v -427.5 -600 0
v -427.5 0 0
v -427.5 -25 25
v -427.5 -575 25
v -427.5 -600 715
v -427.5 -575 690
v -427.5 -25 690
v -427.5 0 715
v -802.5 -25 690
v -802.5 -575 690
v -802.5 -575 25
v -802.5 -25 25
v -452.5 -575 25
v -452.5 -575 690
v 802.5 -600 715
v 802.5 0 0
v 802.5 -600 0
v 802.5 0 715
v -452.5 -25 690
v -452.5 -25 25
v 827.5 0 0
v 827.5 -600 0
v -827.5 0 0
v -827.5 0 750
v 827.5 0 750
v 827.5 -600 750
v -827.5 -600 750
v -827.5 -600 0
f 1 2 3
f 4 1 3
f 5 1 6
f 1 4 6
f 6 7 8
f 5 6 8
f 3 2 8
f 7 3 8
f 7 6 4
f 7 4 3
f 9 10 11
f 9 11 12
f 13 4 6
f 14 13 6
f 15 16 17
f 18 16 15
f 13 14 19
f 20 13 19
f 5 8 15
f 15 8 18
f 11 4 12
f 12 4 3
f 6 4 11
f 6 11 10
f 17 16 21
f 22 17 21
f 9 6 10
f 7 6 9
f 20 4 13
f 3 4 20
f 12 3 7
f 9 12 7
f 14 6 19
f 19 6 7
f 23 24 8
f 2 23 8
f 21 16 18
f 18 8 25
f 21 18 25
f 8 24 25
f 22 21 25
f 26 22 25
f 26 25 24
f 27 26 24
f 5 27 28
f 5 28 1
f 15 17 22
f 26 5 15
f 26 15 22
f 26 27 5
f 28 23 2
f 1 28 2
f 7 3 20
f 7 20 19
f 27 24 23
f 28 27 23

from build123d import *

# Parameters (mm, degrees)
F0_W     = 25
F0_H     = 715
F1_DEPTH = 600
F2_W     = 550
F2_H     = 665
F3_DEPTH = 375
F4_DEPTH = 25


with BuildPart() as f1:
    # F0 (on Front) → F1 (new body)
    with BuildSketch(Plane.XZ):
        Polygon((-827.5, 750), (-827.5, 0), (-427.5, 0), (-427.5, 715), (-427.5, 750), align=None)
        Polygon((-427.5, 750), (-427.5, 715), (802.5, 715), (827.5, 715), (827.5, 750), align=None)
        with Locations((815, 357.5)):
            Rectangle(F0_W, F0_H)
    extrude(amount=F1_DEPTH)

    # F2 (on face) → F3 (cut, through all)
    with BuildSketch(Plane.YZ.offset(-427.5)):
        with Locations((-300, 357.5)):
            Rectangle(F2_W, F2_H)
    extrude(amount=-F3_DEPTH, mode=Mode.SUBTRACT)


with BuildPart() as f4:
    # F2 (on face) → F4 (new body)
    with BuildSketch(Plane.YZ.offset(-427.5)):
        with Locations((-300, 357.5)):
            Rectangle(F2_W, F2_H)
    extrude(amount=-F4_DEPTH)


solid = Compound([f1.part, f4.part])
